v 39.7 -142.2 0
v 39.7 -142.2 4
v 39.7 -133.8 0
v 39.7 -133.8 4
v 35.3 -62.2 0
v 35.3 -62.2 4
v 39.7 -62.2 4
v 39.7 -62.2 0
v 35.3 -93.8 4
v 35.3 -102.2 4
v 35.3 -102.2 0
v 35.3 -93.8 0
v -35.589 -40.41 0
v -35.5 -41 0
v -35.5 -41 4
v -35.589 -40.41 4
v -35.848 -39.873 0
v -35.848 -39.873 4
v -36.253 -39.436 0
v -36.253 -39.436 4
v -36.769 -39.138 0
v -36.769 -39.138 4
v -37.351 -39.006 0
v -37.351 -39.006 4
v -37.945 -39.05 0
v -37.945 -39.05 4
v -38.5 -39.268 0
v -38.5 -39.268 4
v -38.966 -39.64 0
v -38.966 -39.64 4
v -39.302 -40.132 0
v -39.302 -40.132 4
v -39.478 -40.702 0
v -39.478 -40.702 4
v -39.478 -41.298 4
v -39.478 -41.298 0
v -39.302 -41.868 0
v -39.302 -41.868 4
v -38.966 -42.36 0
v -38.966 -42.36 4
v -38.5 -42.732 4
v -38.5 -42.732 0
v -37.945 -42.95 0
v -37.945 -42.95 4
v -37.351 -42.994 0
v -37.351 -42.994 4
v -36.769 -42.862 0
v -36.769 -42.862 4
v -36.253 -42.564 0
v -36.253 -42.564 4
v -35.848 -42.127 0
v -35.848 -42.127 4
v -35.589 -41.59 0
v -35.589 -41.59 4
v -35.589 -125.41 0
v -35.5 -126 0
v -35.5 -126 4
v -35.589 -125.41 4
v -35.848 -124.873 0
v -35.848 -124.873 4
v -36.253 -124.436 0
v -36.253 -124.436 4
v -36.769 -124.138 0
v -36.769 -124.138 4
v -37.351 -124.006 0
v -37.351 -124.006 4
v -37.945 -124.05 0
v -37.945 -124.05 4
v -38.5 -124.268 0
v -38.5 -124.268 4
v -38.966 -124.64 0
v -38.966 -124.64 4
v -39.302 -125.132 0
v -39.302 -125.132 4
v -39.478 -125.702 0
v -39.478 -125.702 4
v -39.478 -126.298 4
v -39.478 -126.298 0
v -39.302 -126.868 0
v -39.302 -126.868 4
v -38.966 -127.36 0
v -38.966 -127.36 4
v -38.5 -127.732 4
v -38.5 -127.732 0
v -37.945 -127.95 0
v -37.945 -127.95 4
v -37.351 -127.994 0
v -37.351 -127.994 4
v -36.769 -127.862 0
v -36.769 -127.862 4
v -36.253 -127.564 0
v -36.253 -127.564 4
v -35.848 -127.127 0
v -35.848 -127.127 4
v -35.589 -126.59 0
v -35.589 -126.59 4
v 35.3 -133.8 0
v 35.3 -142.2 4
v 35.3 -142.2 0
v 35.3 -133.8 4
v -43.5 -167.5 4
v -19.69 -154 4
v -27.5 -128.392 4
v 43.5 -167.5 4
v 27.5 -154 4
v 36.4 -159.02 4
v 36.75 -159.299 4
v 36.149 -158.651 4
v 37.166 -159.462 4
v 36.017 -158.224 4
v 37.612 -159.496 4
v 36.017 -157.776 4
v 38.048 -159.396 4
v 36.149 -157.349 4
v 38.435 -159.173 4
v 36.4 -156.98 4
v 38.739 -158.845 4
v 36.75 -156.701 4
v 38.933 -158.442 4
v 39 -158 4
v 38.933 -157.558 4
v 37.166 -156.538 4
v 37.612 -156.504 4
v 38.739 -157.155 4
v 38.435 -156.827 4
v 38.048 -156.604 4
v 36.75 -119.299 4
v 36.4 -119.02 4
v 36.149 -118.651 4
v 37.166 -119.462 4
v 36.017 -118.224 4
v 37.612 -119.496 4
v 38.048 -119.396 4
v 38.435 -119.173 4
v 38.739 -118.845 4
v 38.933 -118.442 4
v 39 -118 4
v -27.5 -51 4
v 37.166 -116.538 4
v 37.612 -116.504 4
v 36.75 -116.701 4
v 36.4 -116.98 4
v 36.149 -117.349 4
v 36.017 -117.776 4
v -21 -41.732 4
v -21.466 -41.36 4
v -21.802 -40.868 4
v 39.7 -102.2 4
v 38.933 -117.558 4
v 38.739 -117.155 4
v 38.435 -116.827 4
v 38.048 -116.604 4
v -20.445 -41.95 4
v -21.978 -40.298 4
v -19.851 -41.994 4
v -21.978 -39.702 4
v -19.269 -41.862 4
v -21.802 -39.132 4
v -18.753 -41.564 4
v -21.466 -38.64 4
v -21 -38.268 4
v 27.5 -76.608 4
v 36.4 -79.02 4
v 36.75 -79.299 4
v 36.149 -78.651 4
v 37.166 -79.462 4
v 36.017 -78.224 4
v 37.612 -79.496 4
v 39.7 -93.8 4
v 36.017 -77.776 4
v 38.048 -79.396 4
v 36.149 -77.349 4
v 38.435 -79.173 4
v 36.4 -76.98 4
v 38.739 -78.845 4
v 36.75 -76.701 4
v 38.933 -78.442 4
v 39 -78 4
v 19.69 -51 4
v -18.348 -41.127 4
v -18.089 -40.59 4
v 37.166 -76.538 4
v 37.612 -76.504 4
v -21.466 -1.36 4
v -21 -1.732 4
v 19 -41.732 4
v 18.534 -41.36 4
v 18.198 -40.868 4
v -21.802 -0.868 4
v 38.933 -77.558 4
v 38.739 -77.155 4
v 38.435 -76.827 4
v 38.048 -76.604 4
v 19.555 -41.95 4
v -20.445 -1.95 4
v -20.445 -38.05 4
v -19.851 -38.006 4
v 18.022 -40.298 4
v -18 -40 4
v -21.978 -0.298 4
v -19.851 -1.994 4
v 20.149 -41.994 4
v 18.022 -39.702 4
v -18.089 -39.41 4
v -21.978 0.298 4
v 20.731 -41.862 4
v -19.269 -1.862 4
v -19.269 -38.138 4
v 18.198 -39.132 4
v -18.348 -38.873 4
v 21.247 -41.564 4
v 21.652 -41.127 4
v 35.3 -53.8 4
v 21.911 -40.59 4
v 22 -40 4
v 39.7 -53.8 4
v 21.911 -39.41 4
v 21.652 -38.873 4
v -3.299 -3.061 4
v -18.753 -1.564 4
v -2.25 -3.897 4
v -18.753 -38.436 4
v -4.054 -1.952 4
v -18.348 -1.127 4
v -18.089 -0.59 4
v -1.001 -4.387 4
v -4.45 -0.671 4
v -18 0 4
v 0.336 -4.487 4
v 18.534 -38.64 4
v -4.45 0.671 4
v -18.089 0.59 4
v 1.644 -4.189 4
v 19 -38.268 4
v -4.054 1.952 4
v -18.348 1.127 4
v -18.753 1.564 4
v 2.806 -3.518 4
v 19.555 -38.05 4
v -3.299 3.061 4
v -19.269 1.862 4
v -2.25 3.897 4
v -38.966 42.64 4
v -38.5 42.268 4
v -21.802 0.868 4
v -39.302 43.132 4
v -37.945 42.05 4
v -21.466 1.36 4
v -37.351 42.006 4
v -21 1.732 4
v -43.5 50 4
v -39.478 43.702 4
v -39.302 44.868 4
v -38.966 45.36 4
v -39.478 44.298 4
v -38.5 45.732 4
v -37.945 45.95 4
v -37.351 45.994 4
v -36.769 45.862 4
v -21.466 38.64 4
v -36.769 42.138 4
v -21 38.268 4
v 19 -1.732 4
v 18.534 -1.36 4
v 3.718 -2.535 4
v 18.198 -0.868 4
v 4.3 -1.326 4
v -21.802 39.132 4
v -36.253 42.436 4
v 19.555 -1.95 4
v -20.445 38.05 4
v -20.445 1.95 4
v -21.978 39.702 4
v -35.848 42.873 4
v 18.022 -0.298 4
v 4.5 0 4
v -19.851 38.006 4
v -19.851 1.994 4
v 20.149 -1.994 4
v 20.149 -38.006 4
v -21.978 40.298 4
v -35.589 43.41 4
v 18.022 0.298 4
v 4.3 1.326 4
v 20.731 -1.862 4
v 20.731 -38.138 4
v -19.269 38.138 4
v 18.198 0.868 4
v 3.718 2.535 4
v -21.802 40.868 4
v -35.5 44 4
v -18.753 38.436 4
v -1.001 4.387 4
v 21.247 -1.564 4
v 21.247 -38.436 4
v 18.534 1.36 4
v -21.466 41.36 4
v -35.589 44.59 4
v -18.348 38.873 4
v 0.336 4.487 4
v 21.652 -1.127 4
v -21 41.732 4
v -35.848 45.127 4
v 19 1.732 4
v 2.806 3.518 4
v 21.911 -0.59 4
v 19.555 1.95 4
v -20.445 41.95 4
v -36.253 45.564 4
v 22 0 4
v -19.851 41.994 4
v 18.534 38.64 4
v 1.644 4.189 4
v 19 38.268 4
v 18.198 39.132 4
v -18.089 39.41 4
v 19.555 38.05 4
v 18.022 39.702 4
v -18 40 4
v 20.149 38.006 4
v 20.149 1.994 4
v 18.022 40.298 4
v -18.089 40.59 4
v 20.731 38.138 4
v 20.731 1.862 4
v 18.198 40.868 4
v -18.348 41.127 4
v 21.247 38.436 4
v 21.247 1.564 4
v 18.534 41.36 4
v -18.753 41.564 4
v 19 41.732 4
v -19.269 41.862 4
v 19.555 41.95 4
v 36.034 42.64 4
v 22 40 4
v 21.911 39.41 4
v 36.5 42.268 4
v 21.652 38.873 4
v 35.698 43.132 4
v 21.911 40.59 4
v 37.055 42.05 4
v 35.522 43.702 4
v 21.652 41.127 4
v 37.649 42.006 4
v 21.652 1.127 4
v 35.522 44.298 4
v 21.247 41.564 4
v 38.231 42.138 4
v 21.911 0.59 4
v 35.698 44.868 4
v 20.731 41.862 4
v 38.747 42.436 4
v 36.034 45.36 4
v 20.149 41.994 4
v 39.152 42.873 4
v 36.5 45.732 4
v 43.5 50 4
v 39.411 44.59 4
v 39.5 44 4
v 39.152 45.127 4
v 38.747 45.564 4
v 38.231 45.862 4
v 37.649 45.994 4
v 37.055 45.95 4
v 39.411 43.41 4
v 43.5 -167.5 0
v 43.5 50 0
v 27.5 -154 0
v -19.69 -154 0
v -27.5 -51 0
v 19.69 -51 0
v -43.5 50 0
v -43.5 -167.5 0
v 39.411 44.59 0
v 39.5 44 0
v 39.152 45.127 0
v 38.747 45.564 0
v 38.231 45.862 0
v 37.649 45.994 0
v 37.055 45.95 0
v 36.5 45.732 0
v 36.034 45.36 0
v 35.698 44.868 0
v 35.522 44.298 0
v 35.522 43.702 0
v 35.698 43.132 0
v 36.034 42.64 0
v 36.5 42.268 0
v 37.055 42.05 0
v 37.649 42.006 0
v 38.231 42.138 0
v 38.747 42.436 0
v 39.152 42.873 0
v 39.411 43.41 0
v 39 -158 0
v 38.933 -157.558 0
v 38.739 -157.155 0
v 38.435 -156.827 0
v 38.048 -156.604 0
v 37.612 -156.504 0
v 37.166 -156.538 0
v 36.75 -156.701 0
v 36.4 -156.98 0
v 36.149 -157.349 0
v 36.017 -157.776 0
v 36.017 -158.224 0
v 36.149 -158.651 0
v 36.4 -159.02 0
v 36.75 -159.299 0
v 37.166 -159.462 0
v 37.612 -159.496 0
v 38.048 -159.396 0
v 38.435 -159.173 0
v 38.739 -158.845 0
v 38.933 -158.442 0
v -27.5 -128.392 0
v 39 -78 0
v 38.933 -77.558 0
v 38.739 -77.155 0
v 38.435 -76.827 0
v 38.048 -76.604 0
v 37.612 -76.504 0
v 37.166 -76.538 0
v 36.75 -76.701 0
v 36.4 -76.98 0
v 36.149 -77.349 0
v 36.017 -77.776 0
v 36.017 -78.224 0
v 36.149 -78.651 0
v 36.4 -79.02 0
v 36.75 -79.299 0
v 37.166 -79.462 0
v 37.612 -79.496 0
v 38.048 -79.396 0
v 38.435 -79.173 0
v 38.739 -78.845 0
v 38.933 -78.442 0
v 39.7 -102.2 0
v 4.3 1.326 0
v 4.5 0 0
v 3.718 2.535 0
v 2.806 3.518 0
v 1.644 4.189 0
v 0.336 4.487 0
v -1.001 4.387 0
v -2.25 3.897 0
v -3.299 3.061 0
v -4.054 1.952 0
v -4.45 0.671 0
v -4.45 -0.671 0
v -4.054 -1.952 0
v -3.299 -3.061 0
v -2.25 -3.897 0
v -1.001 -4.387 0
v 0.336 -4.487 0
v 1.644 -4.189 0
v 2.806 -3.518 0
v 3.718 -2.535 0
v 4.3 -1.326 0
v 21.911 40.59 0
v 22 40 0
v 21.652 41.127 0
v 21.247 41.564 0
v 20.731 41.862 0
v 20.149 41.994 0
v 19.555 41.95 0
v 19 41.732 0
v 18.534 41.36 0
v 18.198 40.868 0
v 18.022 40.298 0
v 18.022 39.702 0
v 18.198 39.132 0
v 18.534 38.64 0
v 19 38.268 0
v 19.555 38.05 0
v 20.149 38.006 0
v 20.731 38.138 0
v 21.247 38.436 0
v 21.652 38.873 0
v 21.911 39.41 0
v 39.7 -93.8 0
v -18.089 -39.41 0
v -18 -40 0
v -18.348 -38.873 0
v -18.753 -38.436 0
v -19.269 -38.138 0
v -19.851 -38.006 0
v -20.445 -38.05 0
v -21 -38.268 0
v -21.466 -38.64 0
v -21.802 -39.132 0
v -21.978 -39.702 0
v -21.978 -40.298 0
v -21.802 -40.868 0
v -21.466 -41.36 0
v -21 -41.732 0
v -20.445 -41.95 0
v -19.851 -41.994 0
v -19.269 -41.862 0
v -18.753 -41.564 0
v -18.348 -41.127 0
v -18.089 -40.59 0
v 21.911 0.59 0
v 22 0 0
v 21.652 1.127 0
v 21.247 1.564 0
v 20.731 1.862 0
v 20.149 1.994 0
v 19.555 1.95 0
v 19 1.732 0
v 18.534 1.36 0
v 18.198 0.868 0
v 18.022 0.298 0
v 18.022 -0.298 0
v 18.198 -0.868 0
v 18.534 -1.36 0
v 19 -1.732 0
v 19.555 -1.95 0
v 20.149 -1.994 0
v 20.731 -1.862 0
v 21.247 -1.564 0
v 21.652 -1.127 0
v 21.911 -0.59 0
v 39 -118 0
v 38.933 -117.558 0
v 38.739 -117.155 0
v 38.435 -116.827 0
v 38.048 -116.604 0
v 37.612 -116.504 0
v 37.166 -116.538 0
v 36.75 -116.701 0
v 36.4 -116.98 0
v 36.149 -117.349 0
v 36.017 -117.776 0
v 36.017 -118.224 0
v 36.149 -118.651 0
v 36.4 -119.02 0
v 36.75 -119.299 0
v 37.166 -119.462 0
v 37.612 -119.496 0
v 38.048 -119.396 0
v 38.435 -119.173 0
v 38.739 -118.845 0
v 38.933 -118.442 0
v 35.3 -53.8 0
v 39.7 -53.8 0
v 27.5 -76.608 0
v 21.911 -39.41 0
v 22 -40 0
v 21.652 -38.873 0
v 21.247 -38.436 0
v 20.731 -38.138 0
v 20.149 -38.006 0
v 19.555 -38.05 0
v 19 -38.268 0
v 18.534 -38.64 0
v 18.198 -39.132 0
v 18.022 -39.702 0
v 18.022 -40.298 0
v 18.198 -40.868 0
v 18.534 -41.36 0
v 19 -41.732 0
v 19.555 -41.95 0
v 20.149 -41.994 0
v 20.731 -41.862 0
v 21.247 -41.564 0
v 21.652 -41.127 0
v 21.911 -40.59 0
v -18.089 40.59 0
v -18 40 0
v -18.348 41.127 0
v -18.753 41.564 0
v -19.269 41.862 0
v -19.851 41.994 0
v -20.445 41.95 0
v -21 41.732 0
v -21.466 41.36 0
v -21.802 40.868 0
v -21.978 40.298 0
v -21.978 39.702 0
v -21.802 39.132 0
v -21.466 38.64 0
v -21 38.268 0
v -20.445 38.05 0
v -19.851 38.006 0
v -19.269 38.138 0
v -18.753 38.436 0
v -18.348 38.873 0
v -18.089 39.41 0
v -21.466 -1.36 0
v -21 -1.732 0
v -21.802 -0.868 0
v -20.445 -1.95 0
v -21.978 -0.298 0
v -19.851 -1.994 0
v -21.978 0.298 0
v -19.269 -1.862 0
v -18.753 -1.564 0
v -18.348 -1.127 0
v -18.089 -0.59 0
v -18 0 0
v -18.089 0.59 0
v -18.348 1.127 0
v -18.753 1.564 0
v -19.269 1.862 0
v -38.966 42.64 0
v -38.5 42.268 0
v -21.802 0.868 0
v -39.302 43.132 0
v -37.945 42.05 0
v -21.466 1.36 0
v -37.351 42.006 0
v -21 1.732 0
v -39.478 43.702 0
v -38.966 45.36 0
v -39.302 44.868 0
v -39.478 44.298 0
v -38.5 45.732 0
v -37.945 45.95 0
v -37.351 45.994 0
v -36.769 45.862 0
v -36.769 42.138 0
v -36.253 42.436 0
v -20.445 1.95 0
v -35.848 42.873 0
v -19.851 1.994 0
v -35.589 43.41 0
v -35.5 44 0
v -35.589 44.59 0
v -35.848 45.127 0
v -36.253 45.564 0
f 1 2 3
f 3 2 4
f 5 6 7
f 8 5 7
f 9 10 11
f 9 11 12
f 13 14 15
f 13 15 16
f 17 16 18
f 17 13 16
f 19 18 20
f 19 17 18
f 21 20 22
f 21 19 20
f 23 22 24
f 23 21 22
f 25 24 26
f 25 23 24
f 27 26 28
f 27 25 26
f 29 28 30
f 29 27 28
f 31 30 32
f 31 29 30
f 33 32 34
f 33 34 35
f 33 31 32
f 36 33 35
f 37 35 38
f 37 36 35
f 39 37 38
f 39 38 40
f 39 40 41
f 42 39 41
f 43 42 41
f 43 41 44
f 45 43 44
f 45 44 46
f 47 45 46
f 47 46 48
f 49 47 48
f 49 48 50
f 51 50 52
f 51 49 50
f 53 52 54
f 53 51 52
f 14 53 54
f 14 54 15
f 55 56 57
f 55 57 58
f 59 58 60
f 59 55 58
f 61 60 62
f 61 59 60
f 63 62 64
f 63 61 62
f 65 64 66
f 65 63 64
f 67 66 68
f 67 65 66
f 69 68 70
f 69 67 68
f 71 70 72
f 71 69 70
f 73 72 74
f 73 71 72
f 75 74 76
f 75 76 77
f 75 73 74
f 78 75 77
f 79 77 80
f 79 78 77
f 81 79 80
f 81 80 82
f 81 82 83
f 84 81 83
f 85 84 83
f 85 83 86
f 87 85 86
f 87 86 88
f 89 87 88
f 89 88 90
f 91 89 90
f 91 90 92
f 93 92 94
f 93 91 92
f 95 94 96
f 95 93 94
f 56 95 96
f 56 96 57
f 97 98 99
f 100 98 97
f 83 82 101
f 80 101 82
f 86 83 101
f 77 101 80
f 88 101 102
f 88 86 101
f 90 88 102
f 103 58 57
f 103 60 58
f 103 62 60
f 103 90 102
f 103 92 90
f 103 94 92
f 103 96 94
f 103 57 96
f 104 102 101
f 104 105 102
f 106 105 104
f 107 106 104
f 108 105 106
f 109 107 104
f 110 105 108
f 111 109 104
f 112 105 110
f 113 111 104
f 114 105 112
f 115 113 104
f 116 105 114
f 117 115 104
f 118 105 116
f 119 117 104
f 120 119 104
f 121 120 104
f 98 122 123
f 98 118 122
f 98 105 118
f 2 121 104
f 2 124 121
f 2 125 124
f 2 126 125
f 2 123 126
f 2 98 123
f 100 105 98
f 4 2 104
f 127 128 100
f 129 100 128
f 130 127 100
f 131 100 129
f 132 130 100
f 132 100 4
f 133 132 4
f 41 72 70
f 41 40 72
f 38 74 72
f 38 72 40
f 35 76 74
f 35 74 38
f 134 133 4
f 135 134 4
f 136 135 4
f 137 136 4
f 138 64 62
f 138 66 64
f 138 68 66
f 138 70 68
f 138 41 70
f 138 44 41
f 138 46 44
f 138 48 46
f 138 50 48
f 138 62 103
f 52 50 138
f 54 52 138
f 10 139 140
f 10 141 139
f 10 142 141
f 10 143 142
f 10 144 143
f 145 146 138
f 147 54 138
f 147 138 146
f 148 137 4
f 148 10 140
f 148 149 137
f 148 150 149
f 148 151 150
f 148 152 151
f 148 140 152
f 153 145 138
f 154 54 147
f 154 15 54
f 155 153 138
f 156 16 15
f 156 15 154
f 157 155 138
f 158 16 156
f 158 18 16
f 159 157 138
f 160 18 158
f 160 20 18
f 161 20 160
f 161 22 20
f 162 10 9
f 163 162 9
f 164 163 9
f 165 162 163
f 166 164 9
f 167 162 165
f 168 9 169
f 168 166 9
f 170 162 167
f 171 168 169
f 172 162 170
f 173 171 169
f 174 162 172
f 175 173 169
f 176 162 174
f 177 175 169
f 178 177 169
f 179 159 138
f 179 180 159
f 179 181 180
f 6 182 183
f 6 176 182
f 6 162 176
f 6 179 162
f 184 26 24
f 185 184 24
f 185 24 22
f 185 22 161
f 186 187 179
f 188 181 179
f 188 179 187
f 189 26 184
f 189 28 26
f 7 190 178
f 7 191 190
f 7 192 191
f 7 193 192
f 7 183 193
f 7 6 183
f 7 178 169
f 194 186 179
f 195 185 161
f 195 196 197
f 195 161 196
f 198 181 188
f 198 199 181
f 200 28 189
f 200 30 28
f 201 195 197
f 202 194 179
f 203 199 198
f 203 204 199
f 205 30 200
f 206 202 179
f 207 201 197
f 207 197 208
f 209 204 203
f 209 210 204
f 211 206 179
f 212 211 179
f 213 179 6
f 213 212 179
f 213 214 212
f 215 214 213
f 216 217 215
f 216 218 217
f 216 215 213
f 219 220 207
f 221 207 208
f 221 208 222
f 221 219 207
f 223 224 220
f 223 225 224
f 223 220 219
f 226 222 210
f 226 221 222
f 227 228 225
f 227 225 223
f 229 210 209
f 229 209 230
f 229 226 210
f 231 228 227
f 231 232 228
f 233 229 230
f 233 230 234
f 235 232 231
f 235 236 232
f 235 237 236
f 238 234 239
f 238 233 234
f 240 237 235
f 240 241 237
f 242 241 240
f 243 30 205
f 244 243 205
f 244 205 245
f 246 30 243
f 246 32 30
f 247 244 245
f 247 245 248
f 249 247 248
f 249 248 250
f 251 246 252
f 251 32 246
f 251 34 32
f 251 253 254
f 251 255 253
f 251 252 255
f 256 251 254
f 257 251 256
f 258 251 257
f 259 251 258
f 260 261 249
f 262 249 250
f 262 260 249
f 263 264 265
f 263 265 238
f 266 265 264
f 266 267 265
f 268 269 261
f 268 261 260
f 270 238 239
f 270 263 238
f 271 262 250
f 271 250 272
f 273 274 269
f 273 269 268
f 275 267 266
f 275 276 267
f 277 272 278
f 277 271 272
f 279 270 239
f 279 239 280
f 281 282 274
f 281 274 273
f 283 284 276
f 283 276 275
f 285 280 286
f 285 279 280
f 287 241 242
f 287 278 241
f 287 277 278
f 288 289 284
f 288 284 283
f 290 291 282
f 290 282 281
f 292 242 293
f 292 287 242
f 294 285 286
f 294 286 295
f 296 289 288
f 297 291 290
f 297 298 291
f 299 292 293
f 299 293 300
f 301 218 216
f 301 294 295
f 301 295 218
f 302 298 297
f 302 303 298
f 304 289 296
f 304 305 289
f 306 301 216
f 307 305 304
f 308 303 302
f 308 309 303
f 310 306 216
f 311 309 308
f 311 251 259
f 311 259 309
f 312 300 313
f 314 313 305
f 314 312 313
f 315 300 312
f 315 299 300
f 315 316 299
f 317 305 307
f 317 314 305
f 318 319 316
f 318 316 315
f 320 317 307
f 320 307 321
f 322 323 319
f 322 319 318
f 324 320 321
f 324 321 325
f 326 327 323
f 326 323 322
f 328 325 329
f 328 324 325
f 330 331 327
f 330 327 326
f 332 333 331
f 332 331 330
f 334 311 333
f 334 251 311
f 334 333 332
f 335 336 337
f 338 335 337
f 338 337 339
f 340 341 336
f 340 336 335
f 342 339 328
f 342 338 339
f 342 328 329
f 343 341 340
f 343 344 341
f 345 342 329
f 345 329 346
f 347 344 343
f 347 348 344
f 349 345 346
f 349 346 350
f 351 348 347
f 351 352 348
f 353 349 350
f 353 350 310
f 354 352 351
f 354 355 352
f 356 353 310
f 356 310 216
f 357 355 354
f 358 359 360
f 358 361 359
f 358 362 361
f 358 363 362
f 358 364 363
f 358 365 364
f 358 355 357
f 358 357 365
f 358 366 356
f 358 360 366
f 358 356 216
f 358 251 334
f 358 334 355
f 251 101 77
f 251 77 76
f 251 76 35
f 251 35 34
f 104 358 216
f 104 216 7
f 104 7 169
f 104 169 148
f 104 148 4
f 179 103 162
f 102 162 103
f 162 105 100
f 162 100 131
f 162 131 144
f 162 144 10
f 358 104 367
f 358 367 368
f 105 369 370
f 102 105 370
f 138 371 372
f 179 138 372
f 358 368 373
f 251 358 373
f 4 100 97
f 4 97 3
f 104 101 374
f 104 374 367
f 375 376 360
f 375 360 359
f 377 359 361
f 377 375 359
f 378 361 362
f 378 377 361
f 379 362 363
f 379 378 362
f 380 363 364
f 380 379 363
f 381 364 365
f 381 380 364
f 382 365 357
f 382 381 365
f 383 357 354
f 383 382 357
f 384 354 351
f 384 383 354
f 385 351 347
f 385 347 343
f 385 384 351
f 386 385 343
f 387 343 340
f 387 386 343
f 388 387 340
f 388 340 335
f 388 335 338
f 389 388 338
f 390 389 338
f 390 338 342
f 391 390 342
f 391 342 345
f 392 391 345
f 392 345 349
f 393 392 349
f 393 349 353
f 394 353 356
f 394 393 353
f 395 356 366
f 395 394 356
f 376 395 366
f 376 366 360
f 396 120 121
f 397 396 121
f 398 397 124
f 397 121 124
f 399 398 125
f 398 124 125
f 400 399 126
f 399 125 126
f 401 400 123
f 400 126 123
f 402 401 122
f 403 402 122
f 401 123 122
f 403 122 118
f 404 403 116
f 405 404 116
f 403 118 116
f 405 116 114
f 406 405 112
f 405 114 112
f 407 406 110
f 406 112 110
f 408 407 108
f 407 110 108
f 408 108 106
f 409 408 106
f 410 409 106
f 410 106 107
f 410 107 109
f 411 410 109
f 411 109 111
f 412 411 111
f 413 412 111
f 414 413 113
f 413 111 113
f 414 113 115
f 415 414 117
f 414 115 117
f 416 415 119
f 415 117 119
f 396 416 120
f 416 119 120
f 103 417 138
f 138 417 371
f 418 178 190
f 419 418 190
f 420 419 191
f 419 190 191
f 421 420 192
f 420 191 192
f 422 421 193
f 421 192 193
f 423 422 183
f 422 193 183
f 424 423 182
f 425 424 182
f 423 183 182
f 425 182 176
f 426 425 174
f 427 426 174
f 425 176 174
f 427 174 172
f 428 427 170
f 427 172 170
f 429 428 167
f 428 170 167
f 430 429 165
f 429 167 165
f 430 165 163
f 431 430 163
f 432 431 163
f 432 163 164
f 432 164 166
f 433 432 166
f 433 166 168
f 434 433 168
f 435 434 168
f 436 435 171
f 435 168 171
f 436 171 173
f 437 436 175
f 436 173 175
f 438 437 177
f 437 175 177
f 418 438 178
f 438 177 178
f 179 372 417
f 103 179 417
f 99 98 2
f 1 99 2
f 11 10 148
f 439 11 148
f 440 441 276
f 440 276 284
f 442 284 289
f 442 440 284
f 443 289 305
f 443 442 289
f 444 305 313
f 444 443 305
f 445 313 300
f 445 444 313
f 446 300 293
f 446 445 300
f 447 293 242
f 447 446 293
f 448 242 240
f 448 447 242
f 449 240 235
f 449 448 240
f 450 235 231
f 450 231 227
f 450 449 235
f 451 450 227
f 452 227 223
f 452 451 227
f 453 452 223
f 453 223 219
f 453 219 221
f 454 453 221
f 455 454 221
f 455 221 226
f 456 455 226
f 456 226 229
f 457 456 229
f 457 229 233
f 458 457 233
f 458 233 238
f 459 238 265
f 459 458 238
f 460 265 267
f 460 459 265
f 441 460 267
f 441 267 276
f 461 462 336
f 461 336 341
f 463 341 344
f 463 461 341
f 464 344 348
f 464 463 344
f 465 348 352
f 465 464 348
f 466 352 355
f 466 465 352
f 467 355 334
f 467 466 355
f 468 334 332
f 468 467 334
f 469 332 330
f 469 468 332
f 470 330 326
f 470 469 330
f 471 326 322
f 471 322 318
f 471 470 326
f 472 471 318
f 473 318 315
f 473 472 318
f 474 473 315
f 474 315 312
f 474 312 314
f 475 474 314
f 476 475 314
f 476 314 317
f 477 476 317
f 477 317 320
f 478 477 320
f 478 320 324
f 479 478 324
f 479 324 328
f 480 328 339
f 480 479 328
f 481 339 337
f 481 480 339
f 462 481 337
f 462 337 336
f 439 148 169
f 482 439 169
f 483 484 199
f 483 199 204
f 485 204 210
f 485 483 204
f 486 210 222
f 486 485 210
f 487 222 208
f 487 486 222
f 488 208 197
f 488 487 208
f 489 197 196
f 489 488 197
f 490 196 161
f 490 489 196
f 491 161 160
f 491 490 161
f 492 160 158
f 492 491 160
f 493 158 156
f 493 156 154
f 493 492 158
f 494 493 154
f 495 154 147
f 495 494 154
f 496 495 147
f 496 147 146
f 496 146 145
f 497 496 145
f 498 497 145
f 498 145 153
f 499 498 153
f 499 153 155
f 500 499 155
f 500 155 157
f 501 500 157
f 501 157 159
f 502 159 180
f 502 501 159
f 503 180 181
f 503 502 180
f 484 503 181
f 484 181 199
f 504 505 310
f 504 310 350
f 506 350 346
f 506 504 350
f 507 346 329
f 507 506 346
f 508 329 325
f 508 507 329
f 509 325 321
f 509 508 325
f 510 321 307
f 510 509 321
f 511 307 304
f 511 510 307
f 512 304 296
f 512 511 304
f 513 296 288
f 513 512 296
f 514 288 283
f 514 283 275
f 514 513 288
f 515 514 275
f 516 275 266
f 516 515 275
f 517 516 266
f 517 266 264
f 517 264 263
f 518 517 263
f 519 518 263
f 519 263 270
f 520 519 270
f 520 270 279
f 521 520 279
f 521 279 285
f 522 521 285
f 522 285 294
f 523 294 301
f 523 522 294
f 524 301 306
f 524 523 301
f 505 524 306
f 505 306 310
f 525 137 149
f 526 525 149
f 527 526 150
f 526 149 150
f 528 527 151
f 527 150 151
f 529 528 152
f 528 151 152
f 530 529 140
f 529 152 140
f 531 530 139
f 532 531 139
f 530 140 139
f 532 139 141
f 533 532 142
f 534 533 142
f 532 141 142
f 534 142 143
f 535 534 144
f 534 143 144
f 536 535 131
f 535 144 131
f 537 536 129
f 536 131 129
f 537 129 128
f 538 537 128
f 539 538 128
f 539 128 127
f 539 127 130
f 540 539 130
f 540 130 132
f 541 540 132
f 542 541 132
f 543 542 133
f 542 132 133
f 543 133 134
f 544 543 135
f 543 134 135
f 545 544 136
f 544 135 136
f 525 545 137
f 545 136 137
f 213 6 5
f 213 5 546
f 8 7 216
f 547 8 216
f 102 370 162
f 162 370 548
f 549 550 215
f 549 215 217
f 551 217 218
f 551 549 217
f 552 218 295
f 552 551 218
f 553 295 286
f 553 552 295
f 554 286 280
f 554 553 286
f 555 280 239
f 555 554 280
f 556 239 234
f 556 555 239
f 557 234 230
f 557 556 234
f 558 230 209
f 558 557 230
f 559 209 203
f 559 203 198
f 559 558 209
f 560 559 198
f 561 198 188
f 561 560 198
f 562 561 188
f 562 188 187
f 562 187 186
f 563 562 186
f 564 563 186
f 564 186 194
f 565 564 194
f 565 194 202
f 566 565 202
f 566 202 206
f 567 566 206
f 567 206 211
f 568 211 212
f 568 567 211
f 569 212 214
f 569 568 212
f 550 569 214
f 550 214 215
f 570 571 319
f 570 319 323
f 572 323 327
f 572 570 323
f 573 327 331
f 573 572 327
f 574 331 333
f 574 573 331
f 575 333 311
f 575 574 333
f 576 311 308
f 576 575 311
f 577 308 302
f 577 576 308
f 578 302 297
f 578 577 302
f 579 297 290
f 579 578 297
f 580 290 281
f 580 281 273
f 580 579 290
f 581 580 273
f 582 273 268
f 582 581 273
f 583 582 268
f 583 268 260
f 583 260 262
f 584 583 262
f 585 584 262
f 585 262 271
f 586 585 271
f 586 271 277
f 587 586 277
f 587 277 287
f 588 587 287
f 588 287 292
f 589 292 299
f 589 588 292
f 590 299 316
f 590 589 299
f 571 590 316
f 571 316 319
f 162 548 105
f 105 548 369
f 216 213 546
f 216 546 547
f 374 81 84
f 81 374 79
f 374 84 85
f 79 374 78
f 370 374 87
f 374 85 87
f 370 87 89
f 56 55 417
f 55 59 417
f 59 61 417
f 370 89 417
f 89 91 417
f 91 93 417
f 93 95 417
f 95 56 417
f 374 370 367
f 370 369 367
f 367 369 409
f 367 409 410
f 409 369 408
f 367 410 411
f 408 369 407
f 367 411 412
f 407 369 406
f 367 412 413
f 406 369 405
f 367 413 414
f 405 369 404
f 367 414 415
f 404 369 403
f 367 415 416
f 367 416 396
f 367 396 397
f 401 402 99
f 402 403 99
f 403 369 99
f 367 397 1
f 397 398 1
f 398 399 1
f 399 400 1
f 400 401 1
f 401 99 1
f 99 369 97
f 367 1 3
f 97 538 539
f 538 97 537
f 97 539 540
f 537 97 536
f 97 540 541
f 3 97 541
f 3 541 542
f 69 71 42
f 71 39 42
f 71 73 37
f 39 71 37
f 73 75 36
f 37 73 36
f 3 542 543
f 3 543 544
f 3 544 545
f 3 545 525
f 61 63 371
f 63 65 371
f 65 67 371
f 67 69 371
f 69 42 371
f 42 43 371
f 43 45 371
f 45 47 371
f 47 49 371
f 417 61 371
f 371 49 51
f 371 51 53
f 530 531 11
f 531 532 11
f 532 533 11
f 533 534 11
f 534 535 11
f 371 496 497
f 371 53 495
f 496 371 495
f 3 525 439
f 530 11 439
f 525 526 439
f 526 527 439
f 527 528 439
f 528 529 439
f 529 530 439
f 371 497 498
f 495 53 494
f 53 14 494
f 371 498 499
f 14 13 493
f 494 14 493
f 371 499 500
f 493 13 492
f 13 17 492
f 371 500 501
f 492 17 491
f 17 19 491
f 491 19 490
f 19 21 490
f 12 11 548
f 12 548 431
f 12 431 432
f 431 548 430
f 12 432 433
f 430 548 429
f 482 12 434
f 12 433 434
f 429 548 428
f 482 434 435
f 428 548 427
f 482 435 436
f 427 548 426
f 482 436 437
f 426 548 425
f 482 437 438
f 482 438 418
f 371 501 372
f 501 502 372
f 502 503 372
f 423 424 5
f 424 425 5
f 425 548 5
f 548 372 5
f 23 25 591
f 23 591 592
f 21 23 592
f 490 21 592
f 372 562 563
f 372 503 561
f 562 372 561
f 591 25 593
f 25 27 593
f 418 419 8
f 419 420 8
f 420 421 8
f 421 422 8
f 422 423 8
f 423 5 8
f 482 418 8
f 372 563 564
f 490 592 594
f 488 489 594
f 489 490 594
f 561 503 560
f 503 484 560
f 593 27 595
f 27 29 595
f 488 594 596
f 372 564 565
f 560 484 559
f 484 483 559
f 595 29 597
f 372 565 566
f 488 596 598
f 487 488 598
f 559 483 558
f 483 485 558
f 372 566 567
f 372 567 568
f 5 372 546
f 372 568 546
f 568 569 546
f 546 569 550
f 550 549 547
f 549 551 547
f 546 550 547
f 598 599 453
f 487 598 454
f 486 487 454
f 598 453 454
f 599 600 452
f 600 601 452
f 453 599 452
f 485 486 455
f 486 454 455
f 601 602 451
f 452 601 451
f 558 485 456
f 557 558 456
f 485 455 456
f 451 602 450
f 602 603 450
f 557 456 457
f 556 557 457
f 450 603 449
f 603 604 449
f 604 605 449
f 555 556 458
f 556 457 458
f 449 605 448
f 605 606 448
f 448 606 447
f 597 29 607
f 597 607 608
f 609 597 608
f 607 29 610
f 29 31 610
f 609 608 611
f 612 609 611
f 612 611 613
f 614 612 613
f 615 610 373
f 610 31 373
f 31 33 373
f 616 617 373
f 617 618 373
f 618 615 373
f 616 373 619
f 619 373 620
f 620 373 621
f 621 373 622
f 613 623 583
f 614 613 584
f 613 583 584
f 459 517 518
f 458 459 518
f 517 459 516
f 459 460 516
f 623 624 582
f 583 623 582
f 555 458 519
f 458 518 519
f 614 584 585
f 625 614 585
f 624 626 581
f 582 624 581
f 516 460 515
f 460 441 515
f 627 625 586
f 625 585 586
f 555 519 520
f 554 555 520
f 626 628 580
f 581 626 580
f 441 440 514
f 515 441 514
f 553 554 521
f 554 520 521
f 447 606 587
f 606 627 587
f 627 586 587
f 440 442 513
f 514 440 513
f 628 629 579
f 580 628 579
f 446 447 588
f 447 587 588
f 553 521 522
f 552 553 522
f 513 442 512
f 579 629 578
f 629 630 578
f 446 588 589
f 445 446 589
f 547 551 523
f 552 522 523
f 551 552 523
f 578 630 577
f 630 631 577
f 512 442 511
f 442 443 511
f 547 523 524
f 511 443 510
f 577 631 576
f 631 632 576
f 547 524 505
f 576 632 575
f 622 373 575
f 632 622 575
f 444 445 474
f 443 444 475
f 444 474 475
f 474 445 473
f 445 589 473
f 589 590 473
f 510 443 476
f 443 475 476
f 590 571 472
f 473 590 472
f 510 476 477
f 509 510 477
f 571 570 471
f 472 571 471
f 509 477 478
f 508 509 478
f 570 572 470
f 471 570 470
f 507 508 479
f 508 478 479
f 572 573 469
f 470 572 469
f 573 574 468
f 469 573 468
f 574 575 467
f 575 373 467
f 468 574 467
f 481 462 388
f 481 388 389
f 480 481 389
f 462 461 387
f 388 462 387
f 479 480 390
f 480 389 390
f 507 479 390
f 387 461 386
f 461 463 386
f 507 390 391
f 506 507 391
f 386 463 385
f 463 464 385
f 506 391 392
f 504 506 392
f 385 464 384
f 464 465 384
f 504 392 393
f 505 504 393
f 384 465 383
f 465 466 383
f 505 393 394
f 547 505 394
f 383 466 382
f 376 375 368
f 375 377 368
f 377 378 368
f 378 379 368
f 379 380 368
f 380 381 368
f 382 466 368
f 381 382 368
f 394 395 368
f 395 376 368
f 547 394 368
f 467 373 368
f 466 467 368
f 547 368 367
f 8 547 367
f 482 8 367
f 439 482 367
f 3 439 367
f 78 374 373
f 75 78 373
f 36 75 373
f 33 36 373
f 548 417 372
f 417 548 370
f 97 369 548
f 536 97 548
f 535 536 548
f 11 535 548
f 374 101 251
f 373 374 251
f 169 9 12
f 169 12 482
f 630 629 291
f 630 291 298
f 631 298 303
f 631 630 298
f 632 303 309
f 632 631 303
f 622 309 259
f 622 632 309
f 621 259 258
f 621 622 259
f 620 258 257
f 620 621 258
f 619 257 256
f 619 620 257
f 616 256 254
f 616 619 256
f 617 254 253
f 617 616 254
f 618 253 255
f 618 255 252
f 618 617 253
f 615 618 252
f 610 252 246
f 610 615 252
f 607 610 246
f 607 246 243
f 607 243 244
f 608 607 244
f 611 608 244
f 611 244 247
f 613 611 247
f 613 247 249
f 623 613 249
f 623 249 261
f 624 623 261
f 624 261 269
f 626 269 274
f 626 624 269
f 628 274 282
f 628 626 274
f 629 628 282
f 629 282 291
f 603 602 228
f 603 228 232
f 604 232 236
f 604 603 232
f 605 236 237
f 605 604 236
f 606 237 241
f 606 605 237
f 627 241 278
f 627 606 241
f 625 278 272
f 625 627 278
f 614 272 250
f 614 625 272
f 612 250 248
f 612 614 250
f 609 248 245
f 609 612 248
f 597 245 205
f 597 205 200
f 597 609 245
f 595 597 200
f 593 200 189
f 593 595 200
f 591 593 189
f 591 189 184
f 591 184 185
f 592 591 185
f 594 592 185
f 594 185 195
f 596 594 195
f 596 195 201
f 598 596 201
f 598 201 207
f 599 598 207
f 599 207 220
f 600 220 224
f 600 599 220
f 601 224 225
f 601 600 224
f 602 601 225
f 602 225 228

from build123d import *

# Parameters (mm, degrees)
SKETCH_1_R          = 2
SKETCH_1_R_2        = 4.5
EXTRUDE_1_DEPTH     = 4
SKETCH_2_R          = 1.5
SKETCH_2_W          = 4.4
SKETCH_2_H          = 8.4
CUT_EXTRUDE_1_DEPTH = 4
SKETCH_3_W          = 87
SKETCH_3_H          = 3.5
EXTRUDE_2_DEPTH     = 4


with BuildPart() as part:
    # 草图1 → 凸台-拉伸1 (new body)
    with BuildSketch(Plane.XY):
        Polygon((37.5, 50), (-37.5, 50), (-43.5, 50), (-43.5, -57), (-43.5, -164), (-37.5, -164), (37.5, -164), (43.5, -164), (43.5, -57), (43.5, 50), align=None)
        with Locations((-37.5, -126)):
            Circle(SKETCH_1_R, mode=Mode.SUBTRACT)
        Polygon((-27.5, -128.391668474), (-27.5, -51), (19.690041753, -51), align=None, mode=Mode.SUBTRACT)
        Polygon((-19.690041753, -154), (27.5, -76.608331526), (27.5, -154), align=None, mode=Mode.SUBTRACT)
        with Locations((-37.5, -41)):
            Circle(SKETCH_1_R, mode=Mode.SUBTRACT)
        with Locations((-20, -40)):
            Circle(SKETCH_1_R, mode=Mode.SUBTRACT)
        with Locations((-37.5, 44)):
            Circle(SKETCH_1_R, mode=Mode.SUBTRACT)
        with Locations((-20, 0)):
            Circle(SKETCH_1_R, mode=Mode.SUBTRACT)
        Circle(SKETCH_1_R_2, mode=Mode.SUBTRACT)
        with Locations((-20, 40)):
            Circle(SKETCH_1_R, mode=Mode.SUBTRACT)
        with Locations((20, -40)):
            Circle(SKETCH_1_R, mode=Mode.SUBTRACT)
        with Locations((20, 0)):
            Circle(SKETCH_1_R, mode=Mode.SUBTRACT)
        with Locations((20, 40)):
            Circle(SKETCH_1_R, mode=Mode.SUBTRACT)
        with Locations((37.5, 44)):
            Circle(SKETCH_1_R, mode=Mode.SUBTRACT)
    extrude(amount=EXTRUDE_1_DEPTH)

    # 草图2 → 切除-拉伸1 (cut)
    with BuildSketch(Plane.XY.offset(4)):
        with Locations((37.5, -158)):
            Circle(SKETCH_2_R)
        with Locations((37.5, -78)):
            Circle(SKETCH_2_R)
        with Locations((37.5, -118)):
            Circle(SKETCH_2_R)
        with Locations((37.5, -138)):
            Rectangle(SKETCH_2_W, SKETCH_2_H)
        with Locations((37.5, -98)):
            Rectangle(SKETCH_2_W, SKETCH_2_H)
        with Locations((37.5, -58)):
            Rectangle(SKETCH_2_W, SKETCH_2_H)
    extrude(amount=-CUT_EXTRUDE_1_DEPTH, mode=Mode.SUBTRACT)

    # 草图3 → 凸台-拉伸2 (add)
    with BuildSketch(Plane.XY.offset(4)):
        with Locations((0, -165.75)):
            Rectangle(SKETCH_3_W, SKETCH_3_H)
    extrude(amount=-EXTRUDE_2_DEPTH)


solid = part.part
